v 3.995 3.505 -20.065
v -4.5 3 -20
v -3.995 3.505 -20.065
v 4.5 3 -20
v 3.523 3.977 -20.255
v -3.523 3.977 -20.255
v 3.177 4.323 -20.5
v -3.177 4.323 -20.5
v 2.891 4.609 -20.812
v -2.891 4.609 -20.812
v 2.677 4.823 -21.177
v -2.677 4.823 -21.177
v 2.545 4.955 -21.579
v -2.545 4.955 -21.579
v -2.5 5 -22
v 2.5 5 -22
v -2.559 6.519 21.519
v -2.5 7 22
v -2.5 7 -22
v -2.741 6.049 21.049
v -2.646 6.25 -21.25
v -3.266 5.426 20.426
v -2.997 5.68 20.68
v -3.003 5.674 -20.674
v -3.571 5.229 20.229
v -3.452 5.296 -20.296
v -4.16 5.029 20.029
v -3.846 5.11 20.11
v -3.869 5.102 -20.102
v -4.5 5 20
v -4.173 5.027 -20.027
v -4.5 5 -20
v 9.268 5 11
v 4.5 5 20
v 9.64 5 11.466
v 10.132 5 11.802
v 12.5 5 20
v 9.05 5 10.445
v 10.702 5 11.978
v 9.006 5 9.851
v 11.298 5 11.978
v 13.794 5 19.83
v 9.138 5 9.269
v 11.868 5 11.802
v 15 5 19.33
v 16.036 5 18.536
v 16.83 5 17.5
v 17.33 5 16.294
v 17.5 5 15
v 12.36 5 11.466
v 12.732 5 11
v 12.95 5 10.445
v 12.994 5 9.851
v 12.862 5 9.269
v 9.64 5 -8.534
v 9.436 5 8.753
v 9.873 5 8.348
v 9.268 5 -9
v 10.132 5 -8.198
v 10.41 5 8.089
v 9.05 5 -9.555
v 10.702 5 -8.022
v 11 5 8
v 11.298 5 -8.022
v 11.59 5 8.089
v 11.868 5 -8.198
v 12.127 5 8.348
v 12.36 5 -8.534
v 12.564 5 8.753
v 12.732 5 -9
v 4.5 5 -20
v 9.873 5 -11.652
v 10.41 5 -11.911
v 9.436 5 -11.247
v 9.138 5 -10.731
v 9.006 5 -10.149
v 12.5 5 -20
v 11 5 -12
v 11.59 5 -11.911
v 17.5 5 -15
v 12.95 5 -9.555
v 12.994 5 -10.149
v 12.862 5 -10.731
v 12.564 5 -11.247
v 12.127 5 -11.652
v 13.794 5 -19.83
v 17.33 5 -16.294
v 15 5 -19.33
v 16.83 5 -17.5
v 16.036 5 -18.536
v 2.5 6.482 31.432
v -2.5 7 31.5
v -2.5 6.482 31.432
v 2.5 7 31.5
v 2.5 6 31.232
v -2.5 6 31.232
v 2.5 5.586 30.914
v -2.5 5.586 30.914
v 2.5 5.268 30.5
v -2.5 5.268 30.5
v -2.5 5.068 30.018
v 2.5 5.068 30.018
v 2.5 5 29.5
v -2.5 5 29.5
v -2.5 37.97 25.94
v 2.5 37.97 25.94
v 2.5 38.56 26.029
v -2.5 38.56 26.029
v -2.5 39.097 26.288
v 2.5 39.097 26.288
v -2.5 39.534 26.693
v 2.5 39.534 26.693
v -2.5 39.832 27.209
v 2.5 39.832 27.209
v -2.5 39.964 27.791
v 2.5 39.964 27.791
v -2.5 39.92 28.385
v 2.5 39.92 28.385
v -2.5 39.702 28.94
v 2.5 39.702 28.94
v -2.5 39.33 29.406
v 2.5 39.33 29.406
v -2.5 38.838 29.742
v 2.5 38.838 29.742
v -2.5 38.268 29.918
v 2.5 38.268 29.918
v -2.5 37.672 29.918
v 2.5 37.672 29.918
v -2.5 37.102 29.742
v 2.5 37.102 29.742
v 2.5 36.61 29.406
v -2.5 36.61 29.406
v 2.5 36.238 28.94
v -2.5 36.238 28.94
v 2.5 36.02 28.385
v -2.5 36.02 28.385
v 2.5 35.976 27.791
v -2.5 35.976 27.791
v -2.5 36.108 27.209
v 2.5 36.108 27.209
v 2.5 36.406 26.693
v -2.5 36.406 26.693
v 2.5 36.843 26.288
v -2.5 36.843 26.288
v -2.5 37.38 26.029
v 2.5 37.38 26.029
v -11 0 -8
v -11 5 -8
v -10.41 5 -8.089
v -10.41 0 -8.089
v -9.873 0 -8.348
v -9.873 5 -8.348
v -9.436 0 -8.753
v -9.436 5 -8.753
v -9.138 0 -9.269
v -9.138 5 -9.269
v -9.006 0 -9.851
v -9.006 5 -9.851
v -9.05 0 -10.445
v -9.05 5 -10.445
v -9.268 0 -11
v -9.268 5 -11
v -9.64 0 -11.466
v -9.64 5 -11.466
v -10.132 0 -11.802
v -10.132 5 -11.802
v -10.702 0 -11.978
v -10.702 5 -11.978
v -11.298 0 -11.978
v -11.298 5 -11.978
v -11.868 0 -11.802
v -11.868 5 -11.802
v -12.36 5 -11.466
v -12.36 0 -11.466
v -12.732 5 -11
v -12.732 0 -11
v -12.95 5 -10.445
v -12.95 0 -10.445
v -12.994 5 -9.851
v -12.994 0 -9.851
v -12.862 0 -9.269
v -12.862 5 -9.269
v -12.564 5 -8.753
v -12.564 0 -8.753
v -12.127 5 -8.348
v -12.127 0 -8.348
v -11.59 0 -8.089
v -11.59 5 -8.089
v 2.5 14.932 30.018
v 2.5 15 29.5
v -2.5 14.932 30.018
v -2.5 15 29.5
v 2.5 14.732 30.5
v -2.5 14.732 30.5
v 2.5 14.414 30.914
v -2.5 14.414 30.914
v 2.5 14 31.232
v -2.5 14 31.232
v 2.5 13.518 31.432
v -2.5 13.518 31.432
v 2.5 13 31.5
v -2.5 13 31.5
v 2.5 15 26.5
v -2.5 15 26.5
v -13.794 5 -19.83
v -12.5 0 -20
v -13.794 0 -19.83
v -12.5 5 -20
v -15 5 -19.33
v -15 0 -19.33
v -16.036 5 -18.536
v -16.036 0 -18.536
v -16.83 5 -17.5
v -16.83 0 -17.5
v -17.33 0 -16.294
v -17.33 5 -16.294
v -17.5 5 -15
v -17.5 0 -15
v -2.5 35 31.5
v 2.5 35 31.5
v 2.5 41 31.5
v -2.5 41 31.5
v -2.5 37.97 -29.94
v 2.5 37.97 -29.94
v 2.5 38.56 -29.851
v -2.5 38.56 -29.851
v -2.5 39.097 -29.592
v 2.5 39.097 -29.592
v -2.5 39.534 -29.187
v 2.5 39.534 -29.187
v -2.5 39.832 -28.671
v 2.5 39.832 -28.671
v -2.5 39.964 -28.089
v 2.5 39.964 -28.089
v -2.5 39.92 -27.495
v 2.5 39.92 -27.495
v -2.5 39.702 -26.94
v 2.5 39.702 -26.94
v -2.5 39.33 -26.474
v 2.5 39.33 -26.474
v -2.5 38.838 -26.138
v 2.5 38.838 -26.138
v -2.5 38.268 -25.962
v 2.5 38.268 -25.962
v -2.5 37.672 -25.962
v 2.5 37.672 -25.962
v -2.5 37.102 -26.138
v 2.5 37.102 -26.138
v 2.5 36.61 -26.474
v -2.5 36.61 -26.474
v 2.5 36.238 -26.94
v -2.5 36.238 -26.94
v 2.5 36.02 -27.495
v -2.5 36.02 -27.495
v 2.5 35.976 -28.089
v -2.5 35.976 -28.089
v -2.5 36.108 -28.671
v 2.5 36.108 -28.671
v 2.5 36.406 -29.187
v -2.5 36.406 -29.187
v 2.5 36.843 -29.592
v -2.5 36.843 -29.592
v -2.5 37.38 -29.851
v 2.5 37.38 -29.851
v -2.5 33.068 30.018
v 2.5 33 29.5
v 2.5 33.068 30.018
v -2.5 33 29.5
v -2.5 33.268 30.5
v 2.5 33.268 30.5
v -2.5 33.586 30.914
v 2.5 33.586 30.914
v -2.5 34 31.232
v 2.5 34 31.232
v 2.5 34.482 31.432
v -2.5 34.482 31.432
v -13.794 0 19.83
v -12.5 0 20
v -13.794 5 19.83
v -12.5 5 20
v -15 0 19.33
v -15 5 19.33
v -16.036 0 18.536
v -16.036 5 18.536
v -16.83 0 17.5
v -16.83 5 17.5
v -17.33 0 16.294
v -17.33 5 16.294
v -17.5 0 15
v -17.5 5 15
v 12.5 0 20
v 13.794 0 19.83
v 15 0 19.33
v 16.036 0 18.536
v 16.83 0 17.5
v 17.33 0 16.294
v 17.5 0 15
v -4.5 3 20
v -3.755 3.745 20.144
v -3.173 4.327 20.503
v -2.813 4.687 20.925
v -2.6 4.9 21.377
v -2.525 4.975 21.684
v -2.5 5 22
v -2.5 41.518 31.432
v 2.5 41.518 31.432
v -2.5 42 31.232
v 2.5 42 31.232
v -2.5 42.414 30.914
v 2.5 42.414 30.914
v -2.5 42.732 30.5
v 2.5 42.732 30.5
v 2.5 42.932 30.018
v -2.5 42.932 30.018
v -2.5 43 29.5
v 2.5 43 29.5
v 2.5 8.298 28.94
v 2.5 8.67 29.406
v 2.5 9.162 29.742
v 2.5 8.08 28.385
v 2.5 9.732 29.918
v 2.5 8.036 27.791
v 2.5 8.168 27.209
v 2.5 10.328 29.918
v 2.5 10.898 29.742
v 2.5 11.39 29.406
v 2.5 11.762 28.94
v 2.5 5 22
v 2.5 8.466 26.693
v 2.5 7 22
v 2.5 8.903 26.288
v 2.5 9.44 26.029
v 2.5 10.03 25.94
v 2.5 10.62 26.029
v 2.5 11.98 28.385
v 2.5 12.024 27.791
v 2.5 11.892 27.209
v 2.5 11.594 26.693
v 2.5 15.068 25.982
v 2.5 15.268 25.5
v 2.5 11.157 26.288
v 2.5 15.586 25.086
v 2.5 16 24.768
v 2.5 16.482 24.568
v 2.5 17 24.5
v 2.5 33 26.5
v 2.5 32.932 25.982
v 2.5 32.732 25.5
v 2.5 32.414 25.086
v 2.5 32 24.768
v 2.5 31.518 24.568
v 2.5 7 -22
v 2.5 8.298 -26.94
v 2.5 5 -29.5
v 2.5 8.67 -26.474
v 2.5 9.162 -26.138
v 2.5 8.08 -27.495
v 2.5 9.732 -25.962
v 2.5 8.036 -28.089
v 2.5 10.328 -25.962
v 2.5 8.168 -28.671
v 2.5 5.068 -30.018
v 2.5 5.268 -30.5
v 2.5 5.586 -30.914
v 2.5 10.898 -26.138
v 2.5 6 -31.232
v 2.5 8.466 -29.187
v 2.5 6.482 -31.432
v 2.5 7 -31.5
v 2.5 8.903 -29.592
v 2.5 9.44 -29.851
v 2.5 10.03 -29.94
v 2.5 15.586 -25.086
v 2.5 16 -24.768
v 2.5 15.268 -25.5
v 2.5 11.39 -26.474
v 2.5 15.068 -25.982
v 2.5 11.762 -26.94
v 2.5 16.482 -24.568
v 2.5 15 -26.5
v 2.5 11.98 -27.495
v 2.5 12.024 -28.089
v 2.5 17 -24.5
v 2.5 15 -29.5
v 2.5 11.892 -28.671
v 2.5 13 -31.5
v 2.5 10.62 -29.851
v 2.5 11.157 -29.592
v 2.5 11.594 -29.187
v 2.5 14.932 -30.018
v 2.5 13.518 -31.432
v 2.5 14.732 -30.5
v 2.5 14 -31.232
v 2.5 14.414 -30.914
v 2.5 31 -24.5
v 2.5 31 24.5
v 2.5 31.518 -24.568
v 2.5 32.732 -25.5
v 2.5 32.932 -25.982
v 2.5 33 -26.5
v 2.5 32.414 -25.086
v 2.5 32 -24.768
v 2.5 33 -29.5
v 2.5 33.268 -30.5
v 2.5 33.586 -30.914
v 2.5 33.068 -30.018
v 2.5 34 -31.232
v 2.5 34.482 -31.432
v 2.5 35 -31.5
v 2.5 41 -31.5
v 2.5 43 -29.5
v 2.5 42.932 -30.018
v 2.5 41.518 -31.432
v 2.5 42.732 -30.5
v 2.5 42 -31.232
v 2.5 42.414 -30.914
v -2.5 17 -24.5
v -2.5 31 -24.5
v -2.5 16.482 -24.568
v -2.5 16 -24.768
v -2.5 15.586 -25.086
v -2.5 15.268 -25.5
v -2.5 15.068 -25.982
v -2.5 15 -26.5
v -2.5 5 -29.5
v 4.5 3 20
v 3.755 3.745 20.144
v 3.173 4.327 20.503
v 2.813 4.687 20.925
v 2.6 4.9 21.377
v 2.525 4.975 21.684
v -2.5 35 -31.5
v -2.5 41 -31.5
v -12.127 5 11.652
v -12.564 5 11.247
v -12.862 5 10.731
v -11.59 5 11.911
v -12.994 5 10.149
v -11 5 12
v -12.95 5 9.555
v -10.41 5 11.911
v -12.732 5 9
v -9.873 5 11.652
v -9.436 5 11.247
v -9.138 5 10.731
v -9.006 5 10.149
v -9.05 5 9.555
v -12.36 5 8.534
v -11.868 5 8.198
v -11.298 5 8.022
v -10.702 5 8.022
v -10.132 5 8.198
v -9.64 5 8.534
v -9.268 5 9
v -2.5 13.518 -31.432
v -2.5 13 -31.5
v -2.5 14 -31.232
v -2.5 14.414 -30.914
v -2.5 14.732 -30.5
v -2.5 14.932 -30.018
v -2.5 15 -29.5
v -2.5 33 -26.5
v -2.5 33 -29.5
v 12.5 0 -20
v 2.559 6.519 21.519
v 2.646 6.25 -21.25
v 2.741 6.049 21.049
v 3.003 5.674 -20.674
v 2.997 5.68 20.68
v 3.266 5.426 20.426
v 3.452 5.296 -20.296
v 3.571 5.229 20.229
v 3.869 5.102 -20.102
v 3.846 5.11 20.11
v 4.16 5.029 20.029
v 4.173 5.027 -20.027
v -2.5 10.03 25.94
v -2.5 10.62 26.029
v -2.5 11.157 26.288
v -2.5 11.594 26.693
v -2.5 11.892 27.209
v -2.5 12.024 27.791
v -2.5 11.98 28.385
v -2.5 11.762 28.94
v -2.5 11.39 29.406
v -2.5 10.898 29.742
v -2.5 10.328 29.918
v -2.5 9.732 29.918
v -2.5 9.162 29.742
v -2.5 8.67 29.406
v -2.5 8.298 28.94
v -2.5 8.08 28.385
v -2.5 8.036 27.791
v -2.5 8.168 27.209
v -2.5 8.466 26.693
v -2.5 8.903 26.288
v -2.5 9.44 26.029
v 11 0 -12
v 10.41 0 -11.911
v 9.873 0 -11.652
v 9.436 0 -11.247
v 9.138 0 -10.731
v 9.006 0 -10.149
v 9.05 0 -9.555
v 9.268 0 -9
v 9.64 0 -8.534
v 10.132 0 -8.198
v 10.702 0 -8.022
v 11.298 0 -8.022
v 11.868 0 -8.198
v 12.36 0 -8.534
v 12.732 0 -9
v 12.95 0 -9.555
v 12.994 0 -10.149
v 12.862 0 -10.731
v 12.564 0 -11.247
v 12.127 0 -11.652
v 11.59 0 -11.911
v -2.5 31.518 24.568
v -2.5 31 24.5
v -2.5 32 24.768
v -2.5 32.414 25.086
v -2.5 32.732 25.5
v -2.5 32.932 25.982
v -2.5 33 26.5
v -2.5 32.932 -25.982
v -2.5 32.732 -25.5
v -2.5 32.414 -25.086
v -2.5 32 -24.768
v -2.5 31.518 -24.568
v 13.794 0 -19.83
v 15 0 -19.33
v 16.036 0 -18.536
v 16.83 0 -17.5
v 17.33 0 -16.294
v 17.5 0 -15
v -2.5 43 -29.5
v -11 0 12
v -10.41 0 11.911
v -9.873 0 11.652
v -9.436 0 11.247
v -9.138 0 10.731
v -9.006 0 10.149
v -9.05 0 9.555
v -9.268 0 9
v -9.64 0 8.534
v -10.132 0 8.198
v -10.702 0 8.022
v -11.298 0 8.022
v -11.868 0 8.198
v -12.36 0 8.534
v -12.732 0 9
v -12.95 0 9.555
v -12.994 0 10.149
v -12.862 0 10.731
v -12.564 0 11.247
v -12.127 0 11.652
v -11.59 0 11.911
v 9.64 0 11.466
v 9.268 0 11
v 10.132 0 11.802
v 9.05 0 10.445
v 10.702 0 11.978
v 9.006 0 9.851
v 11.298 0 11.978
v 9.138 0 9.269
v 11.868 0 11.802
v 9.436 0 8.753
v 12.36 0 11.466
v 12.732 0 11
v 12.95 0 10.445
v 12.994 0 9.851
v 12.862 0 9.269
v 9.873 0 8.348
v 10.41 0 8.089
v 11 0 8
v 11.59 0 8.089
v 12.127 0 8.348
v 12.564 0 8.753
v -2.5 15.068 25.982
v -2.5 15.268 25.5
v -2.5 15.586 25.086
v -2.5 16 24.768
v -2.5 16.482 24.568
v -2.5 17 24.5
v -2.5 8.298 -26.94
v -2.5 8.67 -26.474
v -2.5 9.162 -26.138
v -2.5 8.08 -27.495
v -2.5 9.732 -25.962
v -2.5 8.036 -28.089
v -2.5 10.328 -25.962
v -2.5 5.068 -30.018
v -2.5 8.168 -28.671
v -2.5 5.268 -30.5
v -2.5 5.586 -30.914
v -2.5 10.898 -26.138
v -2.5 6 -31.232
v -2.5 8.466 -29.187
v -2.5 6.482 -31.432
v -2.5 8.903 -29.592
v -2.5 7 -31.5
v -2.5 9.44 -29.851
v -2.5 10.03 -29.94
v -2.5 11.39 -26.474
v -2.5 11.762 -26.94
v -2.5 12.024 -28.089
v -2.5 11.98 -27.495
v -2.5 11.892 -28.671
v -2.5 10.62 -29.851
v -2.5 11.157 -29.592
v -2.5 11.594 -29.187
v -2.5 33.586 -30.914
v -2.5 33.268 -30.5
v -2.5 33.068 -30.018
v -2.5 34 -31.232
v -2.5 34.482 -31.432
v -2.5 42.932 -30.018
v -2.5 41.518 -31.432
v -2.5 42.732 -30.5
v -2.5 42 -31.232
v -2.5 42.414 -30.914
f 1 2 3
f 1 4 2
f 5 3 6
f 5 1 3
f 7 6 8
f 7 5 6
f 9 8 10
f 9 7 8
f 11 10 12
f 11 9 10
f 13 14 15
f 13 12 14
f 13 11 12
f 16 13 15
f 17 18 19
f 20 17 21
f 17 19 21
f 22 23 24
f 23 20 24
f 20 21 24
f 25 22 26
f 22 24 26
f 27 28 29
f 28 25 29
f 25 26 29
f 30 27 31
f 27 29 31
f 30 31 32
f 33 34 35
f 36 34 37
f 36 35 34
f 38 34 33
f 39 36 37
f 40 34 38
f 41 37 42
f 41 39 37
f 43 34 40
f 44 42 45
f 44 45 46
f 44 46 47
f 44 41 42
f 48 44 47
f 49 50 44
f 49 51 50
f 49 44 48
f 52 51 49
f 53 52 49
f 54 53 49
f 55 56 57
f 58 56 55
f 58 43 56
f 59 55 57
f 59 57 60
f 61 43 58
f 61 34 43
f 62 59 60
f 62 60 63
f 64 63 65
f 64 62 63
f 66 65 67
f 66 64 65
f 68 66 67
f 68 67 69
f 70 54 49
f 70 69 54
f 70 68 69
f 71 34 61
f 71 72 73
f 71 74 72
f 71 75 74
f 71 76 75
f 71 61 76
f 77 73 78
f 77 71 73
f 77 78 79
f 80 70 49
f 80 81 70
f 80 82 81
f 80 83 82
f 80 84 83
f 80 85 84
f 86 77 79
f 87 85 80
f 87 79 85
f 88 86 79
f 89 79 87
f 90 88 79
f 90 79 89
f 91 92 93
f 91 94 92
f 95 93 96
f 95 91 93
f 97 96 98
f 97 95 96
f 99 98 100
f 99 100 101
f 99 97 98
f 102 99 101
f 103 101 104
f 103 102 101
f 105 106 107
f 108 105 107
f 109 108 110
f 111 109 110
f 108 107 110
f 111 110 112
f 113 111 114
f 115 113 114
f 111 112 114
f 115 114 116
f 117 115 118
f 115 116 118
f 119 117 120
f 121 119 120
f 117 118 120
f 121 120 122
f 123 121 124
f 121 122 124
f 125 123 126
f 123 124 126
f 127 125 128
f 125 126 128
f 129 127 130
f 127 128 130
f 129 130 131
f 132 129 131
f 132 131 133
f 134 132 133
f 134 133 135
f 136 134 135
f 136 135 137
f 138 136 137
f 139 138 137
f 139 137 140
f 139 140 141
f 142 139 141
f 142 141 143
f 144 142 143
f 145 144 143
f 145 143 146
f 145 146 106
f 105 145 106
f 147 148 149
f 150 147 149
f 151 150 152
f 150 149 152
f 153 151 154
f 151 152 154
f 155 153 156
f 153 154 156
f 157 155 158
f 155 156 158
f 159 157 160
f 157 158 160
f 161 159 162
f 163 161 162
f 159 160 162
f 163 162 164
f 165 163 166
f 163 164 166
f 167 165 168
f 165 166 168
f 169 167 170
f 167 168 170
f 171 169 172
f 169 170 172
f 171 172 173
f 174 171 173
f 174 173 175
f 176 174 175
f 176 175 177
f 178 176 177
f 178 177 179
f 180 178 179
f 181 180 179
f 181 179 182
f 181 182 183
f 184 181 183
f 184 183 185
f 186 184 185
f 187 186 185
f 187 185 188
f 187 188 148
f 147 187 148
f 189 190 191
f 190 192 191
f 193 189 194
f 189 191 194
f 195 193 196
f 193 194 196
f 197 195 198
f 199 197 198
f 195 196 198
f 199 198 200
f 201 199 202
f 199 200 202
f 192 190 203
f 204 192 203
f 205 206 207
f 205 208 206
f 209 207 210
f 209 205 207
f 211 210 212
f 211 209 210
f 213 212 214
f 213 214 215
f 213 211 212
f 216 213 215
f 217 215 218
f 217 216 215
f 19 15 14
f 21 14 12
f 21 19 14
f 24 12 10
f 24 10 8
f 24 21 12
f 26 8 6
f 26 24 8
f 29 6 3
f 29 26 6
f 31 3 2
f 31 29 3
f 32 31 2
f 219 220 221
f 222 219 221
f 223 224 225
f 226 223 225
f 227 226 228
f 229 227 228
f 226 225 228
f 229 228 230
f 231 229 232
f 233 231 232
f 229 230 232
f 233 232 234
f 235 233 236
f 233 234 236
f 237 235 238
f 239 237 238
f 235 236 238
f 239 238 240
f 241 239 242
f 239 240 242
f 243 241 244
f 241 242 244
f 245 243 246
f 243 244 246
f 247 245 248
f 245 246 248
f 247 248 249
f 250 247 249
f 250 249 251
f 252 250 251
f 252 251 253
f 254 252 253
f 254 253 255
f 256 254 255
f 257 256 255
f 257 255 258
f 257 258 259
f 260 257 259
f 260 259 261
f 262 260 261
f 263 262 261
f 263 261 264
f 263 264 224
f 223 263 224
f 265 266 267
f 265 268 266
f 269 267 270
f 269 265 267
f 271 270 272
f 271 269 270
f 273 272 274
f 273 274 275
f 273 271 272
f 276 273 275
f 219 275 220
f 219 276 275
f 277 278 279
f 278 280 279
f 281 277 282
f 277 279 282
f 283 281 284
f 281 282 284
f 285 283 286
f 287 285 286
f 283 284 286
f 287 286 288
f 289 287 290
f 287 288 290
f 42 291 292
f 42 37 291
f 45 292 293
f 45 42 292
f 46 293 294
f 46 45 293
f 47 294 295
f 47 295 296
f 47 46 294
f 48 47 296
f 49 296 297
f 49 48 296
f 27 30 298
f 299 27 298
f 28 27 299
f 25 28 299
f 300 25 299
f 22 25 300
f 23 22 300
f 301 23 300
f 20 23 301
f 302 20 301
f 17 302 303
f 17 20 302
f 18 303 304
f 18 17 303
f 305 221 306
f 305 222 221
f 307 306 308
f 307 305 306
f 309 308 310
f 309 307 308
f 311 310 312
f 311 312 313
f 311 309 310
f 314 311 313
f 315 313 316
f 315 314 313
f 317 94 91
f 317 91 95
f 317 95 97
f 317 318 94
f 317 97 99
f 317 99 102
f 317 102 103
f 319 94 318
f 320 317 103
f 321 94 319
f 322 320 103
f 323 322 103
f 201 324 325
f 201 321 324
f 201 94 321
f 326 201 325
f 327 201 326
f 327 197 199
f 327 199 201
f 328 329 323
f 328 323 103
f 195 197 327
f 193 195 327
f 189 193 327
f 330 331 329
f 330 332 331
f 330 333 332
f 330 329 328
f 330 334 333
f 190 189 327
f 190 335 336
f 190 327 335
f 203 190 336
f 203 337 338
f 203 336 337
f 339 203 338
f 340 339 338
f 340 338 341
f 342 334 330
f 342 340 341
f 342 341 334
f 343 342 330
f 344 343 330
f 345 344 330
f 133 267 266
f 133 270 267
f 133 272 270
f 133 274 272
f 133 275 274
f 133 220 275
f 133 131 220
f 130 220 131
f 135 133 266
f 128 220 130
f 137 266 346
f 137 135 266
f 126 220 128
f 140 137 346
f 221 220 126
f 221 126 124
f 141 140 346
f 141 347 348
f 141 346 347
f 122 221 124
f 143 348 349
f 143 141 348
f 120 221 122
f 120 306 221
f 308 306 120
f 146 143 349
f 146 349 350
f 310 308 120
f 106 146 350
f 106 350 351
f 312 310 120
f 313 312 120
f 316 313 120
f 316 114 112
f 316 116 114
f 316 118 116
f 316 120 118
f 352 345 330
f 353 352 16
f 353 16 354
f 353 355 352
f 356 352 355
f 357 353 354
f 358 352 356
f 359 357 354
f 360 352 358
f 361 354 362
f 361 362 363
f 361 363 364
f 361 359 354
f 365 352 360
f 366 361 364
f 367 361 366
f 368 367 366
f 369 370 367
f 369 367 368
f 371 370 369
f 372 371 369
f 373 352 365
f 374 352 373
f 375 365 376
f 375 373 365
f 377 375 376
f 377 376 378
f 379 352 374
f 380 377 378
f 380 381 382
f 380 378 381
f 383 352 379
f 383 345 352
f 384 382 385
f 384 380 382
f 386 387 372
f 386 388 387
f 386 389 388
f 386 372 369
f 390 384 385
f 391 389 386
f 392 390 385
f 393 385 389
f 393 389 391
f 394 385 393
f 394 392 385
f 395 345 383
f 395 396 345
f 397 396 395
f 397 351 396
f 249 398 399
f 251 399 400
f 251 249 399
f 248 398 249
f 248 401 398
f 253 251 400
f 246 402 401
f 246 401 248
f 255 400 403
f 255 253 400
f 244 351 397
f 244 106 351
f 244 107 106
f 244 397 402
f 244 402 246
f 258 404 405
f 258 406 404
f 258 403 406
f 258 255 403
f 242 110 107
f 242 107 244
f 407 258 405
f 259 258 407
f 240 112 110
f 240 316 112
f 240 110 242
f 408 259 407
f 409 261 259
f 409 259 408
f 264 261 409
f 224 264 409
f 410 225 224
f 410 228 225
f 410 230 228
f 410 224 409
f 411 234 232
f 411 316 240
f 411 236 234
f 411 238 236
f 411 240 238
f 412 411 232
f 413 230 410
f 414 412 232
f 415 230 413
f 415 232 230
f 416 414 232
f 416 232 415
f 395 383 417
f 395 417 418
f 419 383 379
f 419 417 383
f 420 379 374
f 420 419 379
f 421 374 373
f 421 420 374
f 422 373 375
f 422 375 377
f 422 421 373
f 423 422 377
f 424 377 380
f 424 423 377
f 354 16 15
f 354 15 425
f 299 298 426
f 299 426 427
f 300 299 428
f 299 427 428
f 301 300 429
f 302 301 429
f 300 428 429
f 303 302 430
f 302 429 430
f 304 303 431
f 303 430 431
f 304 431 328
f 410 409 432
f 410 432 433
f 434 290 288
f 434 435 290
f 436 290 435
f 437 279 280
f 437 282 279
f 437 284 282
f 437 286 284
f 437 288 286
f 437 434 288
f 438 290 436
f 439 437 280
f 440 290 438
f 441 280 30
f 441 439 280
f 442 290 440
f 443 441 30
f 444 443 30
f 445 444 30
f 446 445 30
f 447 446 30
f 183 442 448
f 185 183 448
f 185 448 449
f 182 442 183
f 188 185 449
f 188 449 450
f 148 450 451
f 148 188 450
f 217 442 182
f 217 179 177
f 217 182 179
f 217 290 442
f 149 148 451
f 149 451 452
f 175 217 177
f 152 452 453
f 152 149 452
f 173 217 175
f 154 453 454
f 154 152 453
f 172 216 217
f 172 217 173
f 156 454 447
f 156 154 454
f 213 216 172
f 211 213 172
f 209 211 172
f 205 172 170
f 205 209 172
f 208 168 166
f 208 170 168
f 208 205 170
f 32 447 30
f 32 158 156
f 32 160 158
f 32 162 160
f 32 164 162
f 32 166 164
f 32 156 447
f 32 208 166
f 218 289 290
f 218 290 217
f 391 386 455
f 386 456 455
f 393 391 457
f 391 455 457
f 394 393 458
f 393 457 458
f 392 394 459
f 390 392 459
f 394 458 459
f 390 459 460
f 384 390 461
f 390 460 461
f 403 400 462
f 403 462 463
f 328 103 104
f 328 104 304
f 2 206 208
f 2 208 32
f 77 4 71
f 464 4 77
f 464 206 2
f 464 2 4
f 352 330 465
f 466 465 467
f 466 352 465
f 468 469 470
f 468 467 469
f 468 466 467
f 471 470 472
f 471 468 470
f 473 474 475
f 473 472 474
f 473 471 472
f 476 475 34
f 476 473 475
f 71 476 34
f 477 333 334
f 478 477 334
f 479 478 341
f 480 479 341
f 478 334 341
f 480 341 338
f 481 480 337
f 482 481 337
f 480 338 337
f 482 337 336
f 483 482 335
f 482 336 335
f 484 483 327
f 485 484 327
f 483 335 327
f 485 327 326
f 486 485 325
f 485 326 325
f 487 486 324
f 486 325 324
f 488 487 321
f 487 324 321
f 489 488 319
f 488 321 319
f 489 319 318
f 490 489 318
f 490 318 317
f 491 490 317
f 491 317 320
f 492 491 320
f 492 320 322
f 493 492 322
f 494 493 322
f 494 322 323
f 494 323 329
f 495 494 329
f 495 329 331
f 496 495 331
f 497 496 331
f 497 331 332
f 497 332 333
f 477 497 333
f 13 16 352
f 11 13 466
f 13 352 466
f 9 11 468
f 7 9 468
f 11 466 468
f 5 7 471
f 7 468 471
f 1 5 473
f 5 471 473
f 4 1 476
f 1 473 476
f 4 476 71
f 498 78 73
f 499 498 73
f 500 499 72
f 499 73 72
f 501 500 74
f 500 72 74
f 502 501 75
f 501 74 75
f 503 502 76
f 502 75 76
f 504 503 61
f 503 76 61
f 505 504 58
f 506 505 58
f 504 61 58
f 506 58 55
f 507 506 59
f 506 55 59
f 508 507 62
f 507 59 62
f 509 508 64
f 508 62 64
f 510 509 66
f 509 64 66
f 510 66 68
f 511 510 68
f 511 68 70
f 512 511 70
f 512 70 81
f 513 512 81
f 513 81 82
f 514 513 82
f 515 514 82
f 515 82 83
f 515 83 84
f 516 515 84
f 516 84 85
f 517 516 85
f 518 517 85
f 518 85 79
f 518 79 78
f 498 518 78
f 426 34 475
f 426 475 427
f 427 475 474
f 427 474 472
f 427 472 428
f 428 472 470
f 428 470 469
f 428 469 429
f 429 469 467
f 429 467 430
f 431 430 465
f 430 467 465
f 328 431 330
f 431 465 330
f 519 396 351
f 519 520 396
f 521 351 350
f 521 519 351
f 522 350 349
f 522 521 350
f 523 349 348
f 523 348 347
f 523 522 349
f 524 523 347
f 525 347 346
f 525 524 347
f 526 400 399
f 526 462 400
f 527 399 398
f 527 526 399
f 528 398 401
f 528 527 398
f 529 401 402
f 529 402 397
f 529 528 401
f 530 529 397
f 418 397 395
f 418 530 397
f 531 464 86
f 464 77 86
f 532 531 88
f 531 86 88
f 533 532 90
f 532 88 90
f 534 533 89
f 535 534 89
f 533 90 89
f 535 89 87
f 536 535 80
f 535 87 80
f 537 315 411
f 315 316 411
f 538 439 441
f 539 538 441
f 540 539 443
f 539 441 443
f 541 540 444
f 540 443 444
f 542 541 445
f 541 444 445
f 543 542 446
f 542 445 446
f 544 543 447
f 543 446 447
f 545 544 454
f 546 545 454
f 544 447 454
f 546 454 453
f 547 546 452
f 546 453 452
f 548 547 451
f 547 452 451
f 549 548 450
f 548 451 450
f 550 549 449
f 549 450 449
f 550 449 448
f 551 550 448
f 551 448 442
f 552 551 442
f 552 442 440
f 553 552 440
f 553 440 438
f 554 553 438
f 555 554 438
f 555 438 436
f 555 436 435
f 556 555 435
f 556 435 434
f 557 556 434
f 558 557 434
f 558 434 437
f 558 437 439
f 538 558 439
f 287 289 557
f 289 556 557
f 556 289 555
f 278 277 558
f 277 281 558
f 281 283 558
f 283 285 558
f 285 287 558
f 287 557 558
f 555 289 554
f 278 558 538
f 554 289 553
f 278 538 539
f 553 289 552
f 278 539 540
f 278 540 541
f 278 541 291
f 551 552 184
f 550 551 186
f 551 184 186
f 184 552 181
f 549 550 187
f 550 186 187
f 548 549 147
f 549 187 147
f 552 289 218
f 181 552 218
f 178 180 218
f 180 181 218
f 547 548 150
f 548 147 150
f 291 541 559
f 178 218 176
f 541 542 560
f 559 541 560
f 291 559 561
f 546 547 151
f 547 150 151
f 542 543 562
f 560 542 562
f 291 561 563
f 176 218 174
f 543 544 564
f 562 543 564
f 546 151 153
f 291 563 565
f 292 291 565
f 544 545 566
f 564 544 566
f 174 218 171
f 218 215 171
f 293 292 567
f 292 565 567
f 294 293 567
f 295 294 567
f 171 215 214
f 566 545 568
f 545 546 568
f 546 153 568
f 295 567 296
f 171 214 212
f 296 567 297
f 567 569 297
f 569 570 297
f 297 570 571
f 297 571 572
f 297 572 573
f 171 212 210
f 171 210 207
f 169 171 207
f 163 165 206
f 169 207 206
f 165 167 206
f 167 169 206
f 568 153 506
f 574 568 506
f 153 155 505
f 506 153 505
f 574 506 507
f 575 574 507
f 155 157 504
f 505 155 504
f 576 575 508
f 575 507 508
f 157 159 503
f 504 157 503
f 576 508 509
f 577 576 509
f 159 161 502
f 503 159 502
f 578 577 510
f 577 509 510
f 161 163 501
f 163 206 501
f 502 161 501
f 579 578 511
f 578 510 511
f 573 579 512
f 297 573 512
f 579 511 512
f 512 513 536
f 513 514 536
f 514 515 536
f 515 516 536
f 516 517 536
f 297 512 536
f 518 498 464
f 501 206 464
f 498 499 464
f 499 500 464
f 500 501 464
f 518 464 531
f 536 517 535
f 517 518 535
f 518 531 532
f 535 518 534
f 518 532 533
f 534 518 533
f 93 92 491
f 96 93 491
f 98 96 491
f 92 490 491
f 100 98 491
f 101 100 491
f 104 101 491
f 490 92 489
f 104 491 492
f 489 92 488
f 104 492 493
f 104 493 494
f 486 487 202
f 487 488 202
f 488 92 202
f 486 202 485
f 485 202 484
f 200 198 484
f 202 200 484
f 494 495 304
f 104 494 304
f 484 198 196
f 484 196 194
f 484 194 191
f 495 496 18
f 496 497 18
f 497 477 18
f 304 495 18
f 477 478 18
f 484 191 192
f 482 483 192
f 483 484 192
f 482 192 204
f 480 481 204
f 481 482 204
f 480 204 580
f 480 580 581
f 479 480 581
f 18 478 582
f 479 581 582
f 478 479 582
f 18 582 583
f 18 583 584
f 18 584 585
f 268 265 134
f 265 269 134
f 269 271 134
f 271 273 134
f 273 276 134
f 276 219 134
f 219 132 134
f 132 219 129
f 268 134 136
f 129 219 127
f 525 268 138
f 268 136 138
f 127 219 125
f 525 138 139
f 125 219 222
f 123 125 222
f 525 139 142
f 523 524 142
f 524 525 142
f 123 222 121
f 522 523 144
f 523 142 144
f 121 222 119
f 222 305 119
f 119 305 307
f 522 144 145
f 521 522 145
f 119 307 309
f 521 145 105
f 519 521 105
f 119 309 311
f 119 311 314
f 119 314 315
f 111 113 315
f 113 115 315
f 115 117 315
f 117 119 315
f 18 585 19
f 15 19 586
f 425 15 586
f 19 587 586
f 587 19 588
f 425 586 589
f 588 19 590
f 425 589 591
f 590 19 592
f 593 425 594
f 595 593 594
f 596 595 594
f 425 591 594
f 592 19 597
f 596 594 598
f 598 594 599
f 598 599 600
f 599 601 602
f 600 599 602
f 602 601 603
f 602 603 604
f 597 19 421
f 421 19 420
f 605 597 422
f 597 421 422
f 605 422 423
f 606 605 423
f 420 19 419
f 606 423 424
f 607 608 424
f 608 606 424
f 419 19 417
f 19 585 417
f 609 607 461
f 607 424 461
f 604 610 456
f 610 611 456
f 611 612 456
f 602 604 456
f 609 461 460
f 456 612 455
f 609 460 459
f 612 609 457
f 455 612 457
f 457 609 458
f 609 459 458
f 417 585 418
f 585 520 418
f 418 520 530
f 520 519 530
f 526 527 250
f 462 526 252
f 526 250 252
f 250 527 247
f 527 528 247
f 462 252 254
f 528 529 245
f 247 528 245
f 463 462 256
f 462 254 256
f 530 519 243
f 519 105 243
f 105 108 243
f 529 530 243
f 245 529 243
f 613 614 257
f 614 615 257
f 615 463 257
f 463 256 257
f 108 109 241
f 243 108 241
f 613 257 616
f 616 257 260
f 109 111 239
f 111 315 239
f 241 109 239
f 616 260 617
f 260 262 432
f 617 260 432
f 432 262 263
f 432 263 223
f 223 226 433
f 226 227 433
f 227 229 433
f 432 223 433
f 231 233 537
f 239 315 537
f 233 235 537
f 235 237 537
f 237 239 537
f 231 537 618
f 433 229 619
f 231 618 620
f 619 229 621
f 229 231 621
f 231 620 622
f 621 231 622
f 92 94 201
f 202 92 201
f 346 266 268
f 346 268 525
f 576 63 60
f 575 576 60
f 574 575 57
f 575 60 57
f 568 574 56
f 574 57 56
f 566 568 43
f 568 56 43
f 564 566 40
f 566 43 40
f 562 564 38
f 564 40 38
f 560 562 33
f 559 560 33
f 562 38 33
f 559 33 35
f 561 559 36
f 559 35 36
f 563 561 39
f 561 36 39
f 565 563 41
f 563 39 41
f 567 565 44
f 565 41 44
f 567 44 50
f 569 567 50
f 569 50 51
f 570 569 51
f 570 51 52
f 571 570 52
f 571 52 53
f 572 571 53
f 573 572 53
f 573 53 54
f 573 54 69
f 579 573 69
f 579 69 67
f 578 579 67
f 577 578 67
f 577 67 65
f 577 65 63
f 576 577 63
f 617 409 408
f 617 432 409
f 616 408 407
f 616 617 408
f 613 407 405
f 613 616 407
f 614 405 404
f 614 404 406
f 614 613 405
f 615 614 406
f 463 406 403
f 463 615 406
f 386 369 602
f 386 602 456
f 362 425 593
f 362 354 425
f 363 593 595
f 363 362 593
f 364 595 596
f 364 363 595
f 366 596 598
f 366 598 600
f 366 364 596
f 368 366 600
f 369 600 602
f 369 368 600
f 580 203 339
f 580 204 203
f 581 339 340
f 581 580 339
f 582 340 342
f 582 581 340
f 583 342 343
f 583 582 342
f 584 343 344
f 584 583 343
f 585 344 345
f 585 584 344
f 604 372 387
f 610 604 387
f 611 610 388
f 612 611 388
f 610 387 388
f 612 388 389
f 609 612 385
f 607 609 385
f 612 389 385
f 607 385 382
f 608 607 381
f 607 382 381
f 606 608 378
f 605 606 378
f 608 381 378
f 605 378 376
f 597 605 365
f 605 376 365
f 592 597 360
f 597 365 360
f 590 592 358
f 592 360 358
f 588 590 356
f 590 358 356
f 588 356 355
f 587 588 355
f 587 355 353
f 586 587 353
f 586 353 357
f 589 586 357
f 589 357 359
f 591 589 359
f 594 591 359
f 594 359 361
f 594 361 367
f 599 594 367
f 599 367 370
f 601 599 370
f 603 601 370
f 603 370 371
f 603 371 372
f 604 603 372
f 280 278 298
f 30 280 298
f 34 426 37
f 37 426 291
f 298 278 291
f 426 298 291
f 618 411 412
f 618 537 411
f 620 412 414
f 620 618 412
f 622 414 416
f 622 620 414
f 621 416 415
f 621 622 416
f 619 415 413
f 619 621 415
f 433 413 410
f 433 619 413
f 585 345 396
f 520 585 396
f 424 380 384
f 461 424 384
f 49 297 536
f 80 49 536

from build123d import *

# Parameters (mm, degrees)
ESQUISSE2_W             = 35
ESQUISSE2_H             = 40
BOSS_EXTRU_1_DEPTH      = 5
ESQUISSE3_W             = 63
ESQUISSE3_H             = 38
BOSS_EXTRU_2_DEPTH      = 2.5
ENL_V_MAT_EXTRU_1_REACH = 58.932
ESQUISSE4_R             = 2
ENL_V_MAT_EXTRU_2_REACH = 58.932
ESQUISSE5_W             = 7
ESQUISSE5_H             = 18
CONG_1_R                = 2
CONG_2_R                = 5
CONG_3_R                = 2
ENL_V_MAT_EXTRU_3_REACH = 54.369
ESQUISSE6_R             = 2


with BuildPart() as part:
    # Esquisse2 → Boss.-Extru.1 (new body)
    with BuildSketch(Plane(origin=(0, 0, 0), x_dir=(1, 0, 0), z_dir=(0, 1, 0))):
        Rectangle(ESQUISSE2_W, ESQUISSE2_H)
    extrude(amount=BOSS_EXTRU_1_DEPTH)

    # Esquisse3 → Boss.-Extru.2 (add, symmetric)
    with BuildSketch(Plane(origin=(0, 0, 0), x_dir=(0, 0, -1), z_dir=(1, 0, 0))):
        with Locations((0, 24)):
            Rectangle(ESQUISSE3_W, ESQUISSE3_H)
    extrude(amount=BOSS_EXTRU_2_DEPTH, both=True)

    # Esquisse4 → Enlèv. mat.-Extru.1 (cut, up to next)
    with BuildSketch(Plane(origin=(2.5, 0, 0), x_dir=(0, 0, -1), z_dir=(1, 0, 0)), mode=Mode.PRIVATE) as enl_v_mat_extru_1_sk1:
        with Locations((-27.94, 37.97)):
            Circle(ESQUISSE4_R)
    enl_v_mat_extru_1_tool1 = extrude(enl_v_mat_extru_1_sk1.sketch, amount=-ENL_V_MAT_EXTRU_1_REACH, mode=Mode.PRIVATE) & part.part
    # Esquisse4 → Enlèv. mat.-Extru.1 (cut, up to next)
    with BuildSketch(Plane(origin=(2.5, 0, 0), x_dir=(0, 0, -1), z_dir=(1, 0, 0)), mode=Mode.PRIVATE) as enl_v_mat_extru_1_sk2:
        with Locations((-27.94, 10.03)):
            Circle(ESQUISSE4_R)
    enl_v_mat_extru_1_tool2 = extrude(enl_v_mat_extru_1_sk2.sketch, amount=-ENL_V_MAT_EXTRU_1_REACH, mode=Mode.PRIVATE) & part.part
    # Esquisse4 → Enlèv. mat.-Extru.1 (cut, up to next)
    with BuildSketch(Plane(origin=(2.5, 0, 0), x_dir=(0, 0, -1), z_dir=(1, 0, 0)), mode=Mode.PRIVATE) as enl_v_mat_extru_1_sk3:
        with Locations((27.94, 37.97)):
            Circle(ESQUISSE4_R)
    enl_v_mat_extru_1_tool3 = extrude(enl_v_mat_extru_1_sk3.sketch, amount=-ENL_V_MAT_EXTRU_1_REACH, mode=Mode.PRIVATE) & part.part
    # Esquisse4 → Enlèv. mat.-Extru.1 (cut, up to next)
    with BuildSketch(Plane(origin=(2.5, 0, 0), x_dir=(0, 0, -1), z_dir=(1, 0, 0)), mode=Mode.PRIVATE) as enl_v_mat_extru_1_sk4:
        with Locations((27.94, 10.03)):
            Circle(ESQUISSE4_R)
    enl_v_mat_extru_1_tool4 = extrude(enl_v_mat_extru_1_sk4.sketch, amount=-ENL_V_MAT_EXTRU_1_REACH, mode=Mode.PRIVATE) & part.part
    add(enl_v_mat_extru_1_tool1.solids().sort_by_distance((2.5, 37.97, 27.94))[0], mode=Mode.SUBTRACT)
    add(enl_v_mat_extru_1_tool2.solids().sort_by_distance((2.5, 10.03, 27.94))[0], mode=Mode.SUBTRACT)
    add(enl_v_mat_extru_1_tool3.solids().sort_by_distance((2.5, 37.97, -27.94))[0], mode=Mode.SUBTRACT)
    add(enl_v_mat_extru_1_tool4.solids().sort_by_distance((2.5, 10.03, -27.94))[0], mode=Mode.SUBTRACT)

    # Esquisse5 → Enlèv. mat.-Extru.2 (cut, up to next)
    with BuildSketch(Plane(origin=(2.5, 0, 0), x_dir=(0, 0, -1), z_dir=(1, 0, 0)), mode=Mode.PRIVATE) as enl_v_mat_extru_2_sk1:
        with Locations((-28, 24)):
            Rectangle(ESQUISSE5_W, ESQUISSE5_H)
    enl_v_mat_extru_2_tool1 = extrude(enl_v_mat_extru_2_sk1.sketch, amount=-ENL_V_MAT_EXTRU_2_REACH, mode=Mode.PRIVATE) & part.part
    # Esquisse5 → Enlèv. mat.-Extru.2 (cut, up to next)
    with BuildSketch(Plane(origin=(2.5, 0, 0), x_dir=(0, 0, -1), z_dir=(1, 0, 0)), mode=Mode.PRIVATE) as enl_v_mat_extru_2_sk2:
        with Locations((28, 24)):
            Rectangle(ESQUISSE5_W, ESQUISSE5_H)
    enl_v_mat_extru_2_tool2 = extrude(enl_v_mat_extru_2_sk2.sketch, amount=-ENL_V_MAT_EXTRU_2_REACH, mode=Mode.PRIVATE) & part.part
    add(enl_v_mat_extru_2_tool1.solids().sort_by_distance((2.5, 24, 28))[0], mode=Mode.SUBTRACT)
    add(enl_v_mat_extru_2_tool2.solids().sort_by_distance((2.5, 24, -28))[0], mode=Mode.SUBTRACT)

    # Congé1
    cong_1_edges = [part.edges().sort_by_distance(p)[0] for p in [
        (0, 15, -24.5),
        (0, 33, -24.5),
        (0, 15, 24.5),
        (0, 33, 24.5),
        (-2.5, 5, 0),
        (2.5, 5, 0),
    ]]
    fillet(cong_1_edges, radius=CONG_1_R)
    cong_1_2_edges = [part.edges().sort_by_distance(p)[0] for p in [
        (0, 5, -31.5),
        (0, 15, -31.5),
        (0, 43, -31.5),
        (0, 33, -31.5),
        (0, 5, 31.5),
        (0, 15, 31.5),
        (0, 33, 31.5),
        (0, 43, 31.5),
    ]]
    fillet(cong_1_2_edges, radius=CONG_1_R)

    # Congé2
    cong_2_edges = [part.edges().sort_by_distance(p)[0] for p in [
        (17.5, 2.5, 20),
        (-17.5, 2.5, 20),
        (-17.5, 2.5, -20),
        (17.5, 2.5, -20),
    ]]
    fillet(cong_2_edges, radius=CONG_2_R)

    # Congé3
    cong_3_edges = [part.edges().sort_by_distance(p)[0] for p in [
        (-2.5, 6, 20),
        (2.5, 6, 20),
        (0, 5, 20),
        (2.5, 6, -20),
        (-2.5, 6, -20),
        (0, 5, -20),
    ]]
    fillet(cong_3_edges, radius=CONG_3_R - 0.0001)  # a hair under: the kernel refuses the full size

    # Esquisse6 → Enlèv. mat.-Extru.3 (cut, up to next)
    with BuildSketch(Plane(origin=(0, 5, 0), x_dir=(1, 0, 0), z_dir=(0, 1, 0)), mode=Mode.PRIVATE) as enl_v_mat_extru_3_sk1:
        with Locations(Location((-11, 10, 0), (0, 0, 270))):
            Circle(ESQUISSE6_R)
    enl_v_mat_extru_3_tool1 = extrude(enl_v_mat_extru_3_sk1.sketch, amount=-ENL_V_MAT_EXTRU_3_REACH, mode=Mode.PRIVATE) & part.part
    # Esquisse6 → Enlèv. mat.-Extru.3 (cut, up to next)
    with BuildSketch(Plane(origin=(0, 5, 0), x_dir=(1, 0, 0), z_dir=(0, 1, 0)), mode=Mode.PRIVATE) as enl_v_mat_extru_3_sk2:
        with Locations(Location((-11, -10, 0), (0, 0, 270))):
            Circle(ESQUISSE6_R)
    enl_v_mat_extru_3_tool2 = extrude(enl_v_mat_extru_3_sk2.sketch, amount=-ENL_V_MAT_EXTRU_3_REACH, mode=Mode.PRIVATE) & part.part
    # Esquisse6 → Enlèv. mat.-Extru.3 (cut, up to next)
    with BuildSketch(Plane(origin=(0, 5, 0), x_dir=(1, 0, 0), z_dir=(0, 1, 0)), mode=Mode.PRIVATE) as enl_v_mat_extru_3_sk3:
        with Locations(Location((11, -10, 0), (0, 0, 90))):
            Circle(ESQUISSE6_R)
    enl_v_mat_extru_3_tool3 = extrude(enl_v_mat_extru_3_sk3.sketch, amount=-ENL_V_MAT_EXTRU_3_REACH, mode=Mode.PRIVATE) & part.part
    # Esquisse6 → Enlèv. mat.-Extru.3 (cut, up to next)
    with BuildSketch(Plane(origin=(0, 5, 0), x_dir=(1, 0, 0), z_dir=(0, 1, 0)), mode=Mode.PRIVATE) as enl_v_mat_extru_3_sk4:
        with Locations(Location((11, 10, 0), (0, 0, 90))):
            Circle(ESQUISSE6_R)
    enl_v_mat_extru_3_tool4 = extrude(enl_v_mat_extru_3_sk4.sketch, amount=-ENL_V_MAT_EXTRU_3_REACH, mode=Mode.PRIVATE) & part.part
    add(enl_v_mat_extru_3_tool1.solids().sort_by_distance((-11, 5, -10))[0], mode=Mode.SUBTRACT)
    add(enl_v_mat_extru_3_tool2.solids().sort_by_distance((-11, 5, 10))[0], mode=Mode.SUBTRACT)
    add(enl_v_mat_extru_3_tool3.solids().sort_by_distance((11, 5, 10))[0], mode=Mode.SUBTRACT)
    add(enl_v_mat_extru_3_tool4.solids().sort_by_distance((11, 5, -10))[0], mode=Mode.SUBTRACT)


solid = part.part
